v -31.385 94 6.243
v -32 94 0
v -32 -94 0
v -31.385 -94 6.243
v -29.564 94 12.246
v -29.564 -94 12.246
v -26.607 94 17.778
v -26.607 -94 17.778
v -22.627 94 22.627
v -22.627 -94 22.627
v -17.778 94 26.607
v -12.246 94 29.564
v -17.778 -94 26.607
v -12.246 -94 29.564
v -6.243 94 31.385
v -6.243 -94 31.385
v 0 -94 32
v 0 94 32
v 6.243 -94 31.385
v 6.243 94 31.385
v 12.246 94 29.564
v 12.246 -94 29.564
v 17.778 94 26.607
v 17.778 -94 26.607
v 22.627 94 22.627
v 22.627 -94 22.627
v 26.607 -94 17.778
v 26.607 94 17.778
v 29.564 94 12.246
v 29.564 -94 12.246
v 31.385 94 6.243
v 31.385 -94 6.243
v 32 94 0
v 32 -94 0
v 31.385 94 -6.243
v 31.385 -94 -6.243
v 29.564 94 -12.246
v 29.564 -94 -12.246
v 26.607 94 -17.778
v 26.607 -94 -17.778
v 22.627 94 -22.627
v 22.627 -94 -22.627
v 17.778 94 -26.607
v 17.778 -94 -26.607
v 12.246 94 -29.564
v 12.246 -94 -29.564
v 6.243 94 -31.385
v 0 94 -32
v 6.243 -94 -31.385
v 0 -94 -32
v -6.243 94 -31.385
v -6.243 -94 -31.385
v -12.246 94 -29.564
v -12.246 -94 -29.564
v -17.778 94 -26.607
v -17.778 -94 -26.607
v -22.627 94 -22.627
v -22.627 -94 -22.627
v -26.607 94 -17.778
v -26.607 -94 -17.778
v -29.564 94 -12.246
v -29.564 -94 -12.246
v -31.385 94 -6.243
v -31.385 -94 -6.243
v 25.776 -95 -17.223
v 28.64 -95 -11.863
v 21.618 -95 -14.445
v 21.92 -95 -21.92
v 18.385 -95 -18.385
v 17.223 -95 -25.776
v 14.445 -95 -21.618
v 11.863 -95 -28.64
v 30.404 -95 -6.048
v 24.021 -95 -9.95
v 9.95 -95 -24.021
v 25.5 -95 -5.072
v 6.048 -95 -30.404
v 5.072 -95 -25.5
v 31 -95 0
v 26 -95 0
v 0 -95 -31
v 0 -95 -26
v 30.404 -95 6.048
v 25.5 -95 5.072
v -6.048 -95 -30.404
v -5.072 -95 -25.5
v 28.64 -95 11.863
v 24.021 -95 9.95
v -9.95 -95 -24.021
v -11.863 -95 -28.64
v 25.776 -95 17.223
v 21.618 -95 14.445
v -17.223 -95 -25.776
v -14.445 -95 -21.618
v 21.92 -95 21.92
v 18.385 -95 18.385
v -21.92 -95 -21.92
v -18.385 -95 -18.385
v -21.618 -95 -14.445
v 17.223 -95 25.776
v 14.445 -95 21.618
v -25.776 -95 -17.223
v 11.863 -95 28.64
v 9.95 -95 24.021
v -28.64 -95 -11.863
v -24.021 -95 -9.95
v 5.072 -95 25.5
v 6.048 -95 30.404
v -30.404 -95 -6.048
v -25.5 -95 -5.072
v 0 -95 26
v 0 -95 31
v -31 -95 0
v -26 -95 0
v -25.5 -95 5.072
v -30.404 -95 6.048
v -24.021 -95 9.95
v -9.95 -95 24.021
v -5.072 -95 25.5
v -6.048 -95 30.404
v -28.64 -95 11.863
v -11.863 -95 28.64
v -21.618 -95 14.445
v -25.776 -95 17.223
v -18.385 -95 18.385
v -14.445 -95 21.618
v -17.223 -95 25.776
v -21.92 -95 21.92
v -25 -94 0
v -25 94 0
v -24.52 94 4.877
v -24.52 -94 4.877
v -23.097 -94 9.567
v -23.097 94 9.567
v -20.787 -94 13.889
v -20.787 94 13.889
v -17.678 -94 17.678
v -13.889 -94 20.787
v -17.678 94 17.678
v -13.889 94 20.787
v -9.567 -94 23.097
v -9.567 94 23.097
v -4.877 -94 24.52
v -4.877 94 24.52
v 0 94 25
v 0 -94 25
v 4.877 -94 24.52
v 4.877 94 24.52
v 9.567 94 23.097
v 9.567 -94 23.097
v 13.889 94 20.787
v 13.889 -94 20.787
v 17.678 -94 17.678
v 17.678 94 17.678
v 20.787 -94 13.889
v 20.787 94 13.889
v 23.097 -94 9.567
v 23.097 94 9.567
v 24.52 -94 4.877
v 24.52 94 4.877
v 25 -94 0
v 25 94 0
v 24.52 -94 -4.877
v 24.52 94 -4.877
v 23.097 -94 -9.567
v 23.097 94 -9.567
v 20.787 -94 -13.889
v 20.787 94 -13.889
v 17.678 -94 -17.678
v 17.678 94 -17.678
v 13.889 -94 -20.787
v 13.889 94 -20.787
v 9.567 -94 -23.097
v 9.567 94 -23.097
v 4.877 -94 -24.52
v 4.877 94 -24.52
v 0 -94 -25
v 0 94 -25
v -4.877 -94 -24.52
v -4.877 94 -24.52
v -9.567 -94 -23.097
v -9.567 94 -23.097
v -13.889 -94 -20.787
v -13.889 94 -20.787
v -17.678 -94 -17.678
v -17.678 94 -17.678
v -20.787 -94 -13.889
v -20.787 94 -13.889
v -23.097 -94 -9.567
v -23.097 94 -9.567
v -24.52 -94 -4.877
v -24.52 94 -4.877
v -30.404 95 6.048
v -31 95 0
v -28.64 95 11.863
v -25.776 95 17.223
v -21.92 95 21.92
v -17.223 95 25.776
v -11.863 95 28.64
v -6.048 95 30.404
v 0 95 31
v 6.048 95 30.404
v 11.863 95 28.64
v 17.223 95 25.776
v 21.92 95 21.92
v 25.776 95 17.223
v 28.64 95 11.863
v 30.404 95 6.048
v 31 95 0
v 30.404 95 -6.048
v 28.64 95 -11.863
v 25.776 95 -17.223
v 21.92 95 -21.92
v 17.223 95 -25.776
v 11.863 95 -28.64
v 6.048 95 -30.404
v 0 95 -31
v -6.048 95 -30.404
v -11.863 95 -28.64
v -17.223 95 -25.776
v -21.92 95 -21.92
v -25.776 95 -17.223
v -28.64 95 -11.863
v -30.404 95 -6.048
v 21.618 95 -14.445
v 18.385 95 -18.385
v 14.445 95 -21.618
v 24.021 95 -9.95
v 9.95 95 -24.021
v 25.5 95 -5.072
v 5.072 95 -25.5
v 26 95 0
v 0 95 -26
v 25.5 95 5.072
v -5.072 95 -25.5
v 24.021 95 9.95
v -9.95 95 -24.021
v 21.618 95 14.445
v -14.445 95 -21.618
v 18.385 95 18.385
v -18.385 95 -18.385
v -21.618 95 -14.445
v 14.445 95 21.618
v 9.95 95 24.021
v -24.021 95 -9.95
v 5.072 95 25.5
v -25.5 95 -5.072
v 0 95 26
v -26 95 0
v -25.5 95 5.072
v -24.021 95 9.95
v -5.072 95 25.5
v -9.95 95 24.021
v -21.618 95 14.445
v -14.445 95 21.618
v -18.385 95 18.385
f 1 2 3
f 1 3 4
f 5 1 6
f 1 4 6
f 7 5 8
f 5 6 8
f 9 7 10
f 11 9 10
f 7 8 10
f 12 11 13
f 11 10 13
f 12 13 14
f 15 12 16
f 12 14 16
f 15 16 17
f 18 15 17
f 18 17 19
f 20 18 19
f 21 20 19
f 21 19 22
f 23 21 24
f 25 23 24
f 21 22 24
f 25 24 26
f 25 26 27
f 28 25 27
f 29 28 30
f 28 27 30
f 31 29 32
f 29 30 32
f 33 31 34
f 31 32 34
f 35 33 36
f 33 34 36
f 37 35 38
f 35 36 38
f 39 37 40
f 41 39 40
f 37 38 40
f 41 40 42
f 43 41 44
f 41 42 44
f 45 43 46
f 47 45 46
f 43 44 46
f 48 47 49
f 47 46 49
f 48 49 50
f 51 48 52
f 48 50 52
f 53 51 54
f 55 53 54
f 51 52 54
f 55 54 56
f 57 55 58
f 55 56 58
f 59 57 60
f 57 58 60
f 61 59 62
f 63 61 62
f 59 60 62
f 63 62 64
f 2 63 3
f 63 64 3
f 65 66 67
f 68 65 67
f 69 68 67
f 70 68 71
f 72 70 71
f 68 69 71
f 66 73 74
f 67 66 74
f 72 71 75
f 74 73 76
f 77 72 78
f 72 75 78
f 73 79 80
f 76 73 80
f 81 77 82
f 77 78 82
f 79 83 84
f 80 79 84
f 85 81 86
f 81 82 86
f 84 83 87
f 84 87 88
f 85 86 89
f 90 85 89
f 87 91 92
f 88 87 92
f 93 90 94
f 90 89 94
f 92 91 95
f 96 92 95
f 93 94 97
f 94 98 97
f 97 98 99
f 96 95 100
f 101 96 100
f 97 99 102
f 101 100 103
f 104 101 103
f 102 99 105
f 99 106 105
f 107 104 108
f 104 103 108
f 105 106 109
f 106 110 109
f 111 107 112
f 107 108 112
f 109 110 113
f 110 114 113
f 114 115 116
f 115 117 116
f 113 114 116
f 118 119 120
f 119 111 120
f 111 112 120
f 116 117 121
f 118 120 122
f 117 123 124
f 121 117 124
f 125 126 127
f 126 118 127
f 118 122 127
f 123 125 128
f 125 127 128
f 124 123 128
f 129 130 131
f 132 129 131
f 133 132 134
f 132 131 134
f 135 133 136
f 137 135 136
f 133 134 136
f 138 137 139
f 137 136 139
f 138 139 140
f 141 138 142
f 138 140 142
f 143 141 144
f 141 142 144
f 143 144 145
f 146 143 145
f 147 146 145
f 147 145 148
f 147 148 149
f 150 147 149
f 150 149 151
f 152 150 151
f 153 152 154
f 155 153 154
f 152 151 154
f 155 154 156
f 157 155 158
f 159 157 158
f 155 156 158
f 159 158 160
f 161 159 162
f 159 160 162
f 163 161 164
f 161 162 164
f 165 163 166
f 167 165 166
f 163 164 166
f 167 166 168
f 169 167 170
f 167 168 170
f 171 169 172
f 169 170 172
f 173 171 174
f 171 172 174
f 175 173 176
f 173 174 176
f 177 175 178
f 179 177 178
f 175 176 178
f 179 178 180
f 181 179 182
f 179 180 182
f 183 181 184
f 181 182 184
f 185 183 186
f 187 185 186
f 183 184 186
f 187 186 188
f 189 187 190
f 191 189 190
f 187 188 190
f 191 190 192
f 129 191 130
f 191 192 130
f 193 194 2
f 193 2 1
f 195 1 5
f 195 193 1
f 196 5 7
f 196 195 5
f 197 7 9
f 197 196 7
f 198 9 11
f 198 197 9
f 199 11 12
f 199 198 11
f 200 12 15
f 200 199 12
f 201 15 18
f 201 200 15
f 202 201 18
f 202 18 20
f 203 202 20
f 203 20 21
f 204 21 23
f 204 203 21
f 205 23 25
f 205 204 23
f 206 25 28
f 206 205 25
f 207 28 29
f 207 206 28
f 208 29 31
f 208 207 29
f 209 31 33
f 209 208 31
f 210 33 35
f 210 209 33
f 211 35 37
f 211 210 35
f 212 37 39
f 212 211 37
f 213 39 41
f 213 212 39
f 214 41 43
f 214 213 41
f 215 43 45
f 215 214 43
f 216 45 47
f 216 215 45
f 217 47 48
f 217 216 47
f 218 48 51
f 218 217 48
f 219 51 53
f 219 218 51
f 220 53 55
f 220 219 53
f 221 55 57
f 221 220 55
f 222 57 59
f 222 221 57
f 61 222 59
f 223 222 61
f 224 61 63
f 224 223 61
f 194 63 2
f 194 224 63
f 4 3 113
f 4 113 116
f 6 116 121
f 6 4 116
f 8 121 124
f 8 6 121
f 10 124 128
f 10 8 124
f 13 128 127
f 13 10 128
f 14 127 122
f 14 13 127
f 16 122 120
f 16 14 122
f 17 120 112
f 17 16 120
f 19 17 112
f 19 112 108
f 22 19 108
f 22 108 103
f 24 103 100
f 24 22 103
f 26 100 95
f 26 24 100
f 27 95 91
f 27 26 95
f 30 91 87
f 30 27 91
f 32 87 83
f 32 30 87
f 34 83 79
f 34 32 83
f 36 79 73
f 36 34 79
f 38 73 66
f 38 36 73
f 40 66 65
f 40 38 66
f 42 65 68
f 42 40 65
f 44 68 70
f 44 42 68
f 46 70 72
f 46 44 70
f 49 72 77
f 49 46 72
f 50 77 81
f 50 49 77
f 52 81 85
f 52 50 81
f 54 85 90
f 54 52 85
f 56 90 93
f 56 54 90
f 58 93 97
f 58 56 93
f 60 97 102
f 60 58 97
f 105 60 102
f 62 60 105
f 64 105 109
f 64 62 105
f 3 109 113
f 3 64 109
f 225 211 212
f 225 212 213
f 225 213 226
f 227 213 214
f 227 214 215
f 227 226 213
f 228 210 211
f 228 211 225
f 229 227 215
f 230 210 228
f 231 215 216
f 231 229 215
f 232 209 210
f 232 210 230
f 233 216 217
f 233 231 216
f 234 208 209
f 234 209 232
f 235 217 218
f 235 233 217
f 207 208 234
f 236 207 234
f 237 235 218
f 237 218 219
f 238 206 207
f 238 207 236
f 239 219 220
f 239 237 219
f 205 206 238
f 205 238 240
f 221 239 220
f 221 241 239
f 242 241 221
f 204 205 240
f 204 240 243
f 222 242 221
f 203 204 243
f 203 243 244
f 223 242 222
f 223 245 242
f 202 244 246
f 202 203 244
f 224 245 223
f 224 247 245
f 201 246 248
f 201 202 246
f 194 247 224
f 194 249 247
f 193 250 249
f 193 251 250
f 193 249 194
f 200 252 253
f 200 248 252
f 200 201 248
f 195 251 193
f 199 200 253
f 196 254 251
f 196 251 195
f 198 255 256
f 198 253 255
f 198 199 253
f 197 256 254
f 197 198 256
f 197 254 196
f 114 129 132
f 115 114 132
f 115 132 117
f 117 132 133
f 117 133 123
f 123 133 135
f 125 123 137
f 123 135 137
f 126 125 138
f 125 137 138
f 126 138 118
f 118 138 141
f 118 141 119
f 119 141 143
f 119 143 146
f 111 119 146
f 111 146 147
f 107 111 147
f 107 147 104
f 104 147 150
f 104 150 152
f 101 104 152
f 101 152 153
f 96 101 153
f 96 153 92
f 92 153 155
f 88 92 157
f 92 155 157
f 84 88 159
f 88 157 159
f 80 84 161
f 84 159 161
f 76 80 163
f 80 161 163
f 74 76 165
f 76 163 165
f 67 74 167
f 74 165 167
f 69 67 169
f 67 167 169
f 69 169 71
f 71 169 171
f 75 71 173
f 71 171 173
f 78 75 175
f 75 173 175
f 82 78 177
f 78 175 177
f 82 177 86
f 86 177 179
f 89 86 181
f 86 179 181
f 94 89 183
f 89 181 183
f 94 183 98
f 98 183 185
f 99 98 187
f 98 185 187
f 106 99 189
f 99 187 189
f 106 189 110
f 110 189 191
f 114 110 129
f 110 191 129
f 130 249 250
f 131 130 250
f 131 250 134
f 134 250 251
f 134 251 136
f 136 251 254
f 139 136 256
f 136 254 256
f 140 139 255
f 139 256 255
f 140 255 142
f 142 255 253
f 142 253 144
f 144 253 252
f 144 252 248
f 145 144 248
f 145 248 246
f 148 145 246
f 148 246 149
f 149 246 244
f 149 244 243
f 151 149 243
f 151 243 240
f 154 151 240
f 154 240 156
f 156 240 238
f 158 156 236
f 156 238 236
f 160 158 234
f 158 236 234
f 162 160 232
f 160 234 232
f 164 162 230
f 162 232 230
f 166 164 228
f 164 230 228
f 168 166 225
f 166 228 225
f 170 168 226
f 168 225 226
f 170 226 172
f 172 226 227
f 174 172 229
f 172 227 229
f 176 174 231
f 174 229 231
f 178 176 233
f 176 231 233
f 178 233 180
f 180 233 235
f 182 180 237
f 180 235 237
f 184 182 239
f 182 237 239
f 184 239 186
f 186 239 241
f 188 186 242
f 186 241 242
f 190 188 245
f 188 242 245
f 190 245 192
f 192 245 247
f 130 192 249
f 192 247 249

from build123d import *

# Parameters (mm, degrees)
F0_W    = 7
F0_H    = 95
F2_SIZE = 1
F3_SIZE = 1
F4_SIZE = 1


with BuildPart() as f1:
    # F0 (on Top) → F1 (revolve)
    with BuildSketch(Plane.XY):
        with Locations((-28.5, -47.5)):
            Rectangle(F0_W, F0_H)
        with Locations((-28.5, 47.5)):
            Rectangle(F0_W, F0_H)
    revolve(axis=Axis((0, 0, 0), (0, 1, 0)))

    # F2
    f2_edges = [f1.edges().sort_by_distance(p)[0] for p in [
        (25, -95, 0),
        (-25, 0, 0),
        (25, 95, 0),
    ]]
    chamfer(f2_edges, length=F2_SIZE)

    # F3
    f3_edges = [f1.edges().sort_by_distance(p)[0] for p in [
        (32, -95, 0),
    ]]
    chamfer(f3_edges, length=F3_SIZE)

    # F4
    f4_edges = [f1.edges().sort_by_distance(p)[0] for p in [
        (32, 95, 0),
    ]]
    chamfer(f4_edges, length=F4_SIZE)


solid = f1.part
